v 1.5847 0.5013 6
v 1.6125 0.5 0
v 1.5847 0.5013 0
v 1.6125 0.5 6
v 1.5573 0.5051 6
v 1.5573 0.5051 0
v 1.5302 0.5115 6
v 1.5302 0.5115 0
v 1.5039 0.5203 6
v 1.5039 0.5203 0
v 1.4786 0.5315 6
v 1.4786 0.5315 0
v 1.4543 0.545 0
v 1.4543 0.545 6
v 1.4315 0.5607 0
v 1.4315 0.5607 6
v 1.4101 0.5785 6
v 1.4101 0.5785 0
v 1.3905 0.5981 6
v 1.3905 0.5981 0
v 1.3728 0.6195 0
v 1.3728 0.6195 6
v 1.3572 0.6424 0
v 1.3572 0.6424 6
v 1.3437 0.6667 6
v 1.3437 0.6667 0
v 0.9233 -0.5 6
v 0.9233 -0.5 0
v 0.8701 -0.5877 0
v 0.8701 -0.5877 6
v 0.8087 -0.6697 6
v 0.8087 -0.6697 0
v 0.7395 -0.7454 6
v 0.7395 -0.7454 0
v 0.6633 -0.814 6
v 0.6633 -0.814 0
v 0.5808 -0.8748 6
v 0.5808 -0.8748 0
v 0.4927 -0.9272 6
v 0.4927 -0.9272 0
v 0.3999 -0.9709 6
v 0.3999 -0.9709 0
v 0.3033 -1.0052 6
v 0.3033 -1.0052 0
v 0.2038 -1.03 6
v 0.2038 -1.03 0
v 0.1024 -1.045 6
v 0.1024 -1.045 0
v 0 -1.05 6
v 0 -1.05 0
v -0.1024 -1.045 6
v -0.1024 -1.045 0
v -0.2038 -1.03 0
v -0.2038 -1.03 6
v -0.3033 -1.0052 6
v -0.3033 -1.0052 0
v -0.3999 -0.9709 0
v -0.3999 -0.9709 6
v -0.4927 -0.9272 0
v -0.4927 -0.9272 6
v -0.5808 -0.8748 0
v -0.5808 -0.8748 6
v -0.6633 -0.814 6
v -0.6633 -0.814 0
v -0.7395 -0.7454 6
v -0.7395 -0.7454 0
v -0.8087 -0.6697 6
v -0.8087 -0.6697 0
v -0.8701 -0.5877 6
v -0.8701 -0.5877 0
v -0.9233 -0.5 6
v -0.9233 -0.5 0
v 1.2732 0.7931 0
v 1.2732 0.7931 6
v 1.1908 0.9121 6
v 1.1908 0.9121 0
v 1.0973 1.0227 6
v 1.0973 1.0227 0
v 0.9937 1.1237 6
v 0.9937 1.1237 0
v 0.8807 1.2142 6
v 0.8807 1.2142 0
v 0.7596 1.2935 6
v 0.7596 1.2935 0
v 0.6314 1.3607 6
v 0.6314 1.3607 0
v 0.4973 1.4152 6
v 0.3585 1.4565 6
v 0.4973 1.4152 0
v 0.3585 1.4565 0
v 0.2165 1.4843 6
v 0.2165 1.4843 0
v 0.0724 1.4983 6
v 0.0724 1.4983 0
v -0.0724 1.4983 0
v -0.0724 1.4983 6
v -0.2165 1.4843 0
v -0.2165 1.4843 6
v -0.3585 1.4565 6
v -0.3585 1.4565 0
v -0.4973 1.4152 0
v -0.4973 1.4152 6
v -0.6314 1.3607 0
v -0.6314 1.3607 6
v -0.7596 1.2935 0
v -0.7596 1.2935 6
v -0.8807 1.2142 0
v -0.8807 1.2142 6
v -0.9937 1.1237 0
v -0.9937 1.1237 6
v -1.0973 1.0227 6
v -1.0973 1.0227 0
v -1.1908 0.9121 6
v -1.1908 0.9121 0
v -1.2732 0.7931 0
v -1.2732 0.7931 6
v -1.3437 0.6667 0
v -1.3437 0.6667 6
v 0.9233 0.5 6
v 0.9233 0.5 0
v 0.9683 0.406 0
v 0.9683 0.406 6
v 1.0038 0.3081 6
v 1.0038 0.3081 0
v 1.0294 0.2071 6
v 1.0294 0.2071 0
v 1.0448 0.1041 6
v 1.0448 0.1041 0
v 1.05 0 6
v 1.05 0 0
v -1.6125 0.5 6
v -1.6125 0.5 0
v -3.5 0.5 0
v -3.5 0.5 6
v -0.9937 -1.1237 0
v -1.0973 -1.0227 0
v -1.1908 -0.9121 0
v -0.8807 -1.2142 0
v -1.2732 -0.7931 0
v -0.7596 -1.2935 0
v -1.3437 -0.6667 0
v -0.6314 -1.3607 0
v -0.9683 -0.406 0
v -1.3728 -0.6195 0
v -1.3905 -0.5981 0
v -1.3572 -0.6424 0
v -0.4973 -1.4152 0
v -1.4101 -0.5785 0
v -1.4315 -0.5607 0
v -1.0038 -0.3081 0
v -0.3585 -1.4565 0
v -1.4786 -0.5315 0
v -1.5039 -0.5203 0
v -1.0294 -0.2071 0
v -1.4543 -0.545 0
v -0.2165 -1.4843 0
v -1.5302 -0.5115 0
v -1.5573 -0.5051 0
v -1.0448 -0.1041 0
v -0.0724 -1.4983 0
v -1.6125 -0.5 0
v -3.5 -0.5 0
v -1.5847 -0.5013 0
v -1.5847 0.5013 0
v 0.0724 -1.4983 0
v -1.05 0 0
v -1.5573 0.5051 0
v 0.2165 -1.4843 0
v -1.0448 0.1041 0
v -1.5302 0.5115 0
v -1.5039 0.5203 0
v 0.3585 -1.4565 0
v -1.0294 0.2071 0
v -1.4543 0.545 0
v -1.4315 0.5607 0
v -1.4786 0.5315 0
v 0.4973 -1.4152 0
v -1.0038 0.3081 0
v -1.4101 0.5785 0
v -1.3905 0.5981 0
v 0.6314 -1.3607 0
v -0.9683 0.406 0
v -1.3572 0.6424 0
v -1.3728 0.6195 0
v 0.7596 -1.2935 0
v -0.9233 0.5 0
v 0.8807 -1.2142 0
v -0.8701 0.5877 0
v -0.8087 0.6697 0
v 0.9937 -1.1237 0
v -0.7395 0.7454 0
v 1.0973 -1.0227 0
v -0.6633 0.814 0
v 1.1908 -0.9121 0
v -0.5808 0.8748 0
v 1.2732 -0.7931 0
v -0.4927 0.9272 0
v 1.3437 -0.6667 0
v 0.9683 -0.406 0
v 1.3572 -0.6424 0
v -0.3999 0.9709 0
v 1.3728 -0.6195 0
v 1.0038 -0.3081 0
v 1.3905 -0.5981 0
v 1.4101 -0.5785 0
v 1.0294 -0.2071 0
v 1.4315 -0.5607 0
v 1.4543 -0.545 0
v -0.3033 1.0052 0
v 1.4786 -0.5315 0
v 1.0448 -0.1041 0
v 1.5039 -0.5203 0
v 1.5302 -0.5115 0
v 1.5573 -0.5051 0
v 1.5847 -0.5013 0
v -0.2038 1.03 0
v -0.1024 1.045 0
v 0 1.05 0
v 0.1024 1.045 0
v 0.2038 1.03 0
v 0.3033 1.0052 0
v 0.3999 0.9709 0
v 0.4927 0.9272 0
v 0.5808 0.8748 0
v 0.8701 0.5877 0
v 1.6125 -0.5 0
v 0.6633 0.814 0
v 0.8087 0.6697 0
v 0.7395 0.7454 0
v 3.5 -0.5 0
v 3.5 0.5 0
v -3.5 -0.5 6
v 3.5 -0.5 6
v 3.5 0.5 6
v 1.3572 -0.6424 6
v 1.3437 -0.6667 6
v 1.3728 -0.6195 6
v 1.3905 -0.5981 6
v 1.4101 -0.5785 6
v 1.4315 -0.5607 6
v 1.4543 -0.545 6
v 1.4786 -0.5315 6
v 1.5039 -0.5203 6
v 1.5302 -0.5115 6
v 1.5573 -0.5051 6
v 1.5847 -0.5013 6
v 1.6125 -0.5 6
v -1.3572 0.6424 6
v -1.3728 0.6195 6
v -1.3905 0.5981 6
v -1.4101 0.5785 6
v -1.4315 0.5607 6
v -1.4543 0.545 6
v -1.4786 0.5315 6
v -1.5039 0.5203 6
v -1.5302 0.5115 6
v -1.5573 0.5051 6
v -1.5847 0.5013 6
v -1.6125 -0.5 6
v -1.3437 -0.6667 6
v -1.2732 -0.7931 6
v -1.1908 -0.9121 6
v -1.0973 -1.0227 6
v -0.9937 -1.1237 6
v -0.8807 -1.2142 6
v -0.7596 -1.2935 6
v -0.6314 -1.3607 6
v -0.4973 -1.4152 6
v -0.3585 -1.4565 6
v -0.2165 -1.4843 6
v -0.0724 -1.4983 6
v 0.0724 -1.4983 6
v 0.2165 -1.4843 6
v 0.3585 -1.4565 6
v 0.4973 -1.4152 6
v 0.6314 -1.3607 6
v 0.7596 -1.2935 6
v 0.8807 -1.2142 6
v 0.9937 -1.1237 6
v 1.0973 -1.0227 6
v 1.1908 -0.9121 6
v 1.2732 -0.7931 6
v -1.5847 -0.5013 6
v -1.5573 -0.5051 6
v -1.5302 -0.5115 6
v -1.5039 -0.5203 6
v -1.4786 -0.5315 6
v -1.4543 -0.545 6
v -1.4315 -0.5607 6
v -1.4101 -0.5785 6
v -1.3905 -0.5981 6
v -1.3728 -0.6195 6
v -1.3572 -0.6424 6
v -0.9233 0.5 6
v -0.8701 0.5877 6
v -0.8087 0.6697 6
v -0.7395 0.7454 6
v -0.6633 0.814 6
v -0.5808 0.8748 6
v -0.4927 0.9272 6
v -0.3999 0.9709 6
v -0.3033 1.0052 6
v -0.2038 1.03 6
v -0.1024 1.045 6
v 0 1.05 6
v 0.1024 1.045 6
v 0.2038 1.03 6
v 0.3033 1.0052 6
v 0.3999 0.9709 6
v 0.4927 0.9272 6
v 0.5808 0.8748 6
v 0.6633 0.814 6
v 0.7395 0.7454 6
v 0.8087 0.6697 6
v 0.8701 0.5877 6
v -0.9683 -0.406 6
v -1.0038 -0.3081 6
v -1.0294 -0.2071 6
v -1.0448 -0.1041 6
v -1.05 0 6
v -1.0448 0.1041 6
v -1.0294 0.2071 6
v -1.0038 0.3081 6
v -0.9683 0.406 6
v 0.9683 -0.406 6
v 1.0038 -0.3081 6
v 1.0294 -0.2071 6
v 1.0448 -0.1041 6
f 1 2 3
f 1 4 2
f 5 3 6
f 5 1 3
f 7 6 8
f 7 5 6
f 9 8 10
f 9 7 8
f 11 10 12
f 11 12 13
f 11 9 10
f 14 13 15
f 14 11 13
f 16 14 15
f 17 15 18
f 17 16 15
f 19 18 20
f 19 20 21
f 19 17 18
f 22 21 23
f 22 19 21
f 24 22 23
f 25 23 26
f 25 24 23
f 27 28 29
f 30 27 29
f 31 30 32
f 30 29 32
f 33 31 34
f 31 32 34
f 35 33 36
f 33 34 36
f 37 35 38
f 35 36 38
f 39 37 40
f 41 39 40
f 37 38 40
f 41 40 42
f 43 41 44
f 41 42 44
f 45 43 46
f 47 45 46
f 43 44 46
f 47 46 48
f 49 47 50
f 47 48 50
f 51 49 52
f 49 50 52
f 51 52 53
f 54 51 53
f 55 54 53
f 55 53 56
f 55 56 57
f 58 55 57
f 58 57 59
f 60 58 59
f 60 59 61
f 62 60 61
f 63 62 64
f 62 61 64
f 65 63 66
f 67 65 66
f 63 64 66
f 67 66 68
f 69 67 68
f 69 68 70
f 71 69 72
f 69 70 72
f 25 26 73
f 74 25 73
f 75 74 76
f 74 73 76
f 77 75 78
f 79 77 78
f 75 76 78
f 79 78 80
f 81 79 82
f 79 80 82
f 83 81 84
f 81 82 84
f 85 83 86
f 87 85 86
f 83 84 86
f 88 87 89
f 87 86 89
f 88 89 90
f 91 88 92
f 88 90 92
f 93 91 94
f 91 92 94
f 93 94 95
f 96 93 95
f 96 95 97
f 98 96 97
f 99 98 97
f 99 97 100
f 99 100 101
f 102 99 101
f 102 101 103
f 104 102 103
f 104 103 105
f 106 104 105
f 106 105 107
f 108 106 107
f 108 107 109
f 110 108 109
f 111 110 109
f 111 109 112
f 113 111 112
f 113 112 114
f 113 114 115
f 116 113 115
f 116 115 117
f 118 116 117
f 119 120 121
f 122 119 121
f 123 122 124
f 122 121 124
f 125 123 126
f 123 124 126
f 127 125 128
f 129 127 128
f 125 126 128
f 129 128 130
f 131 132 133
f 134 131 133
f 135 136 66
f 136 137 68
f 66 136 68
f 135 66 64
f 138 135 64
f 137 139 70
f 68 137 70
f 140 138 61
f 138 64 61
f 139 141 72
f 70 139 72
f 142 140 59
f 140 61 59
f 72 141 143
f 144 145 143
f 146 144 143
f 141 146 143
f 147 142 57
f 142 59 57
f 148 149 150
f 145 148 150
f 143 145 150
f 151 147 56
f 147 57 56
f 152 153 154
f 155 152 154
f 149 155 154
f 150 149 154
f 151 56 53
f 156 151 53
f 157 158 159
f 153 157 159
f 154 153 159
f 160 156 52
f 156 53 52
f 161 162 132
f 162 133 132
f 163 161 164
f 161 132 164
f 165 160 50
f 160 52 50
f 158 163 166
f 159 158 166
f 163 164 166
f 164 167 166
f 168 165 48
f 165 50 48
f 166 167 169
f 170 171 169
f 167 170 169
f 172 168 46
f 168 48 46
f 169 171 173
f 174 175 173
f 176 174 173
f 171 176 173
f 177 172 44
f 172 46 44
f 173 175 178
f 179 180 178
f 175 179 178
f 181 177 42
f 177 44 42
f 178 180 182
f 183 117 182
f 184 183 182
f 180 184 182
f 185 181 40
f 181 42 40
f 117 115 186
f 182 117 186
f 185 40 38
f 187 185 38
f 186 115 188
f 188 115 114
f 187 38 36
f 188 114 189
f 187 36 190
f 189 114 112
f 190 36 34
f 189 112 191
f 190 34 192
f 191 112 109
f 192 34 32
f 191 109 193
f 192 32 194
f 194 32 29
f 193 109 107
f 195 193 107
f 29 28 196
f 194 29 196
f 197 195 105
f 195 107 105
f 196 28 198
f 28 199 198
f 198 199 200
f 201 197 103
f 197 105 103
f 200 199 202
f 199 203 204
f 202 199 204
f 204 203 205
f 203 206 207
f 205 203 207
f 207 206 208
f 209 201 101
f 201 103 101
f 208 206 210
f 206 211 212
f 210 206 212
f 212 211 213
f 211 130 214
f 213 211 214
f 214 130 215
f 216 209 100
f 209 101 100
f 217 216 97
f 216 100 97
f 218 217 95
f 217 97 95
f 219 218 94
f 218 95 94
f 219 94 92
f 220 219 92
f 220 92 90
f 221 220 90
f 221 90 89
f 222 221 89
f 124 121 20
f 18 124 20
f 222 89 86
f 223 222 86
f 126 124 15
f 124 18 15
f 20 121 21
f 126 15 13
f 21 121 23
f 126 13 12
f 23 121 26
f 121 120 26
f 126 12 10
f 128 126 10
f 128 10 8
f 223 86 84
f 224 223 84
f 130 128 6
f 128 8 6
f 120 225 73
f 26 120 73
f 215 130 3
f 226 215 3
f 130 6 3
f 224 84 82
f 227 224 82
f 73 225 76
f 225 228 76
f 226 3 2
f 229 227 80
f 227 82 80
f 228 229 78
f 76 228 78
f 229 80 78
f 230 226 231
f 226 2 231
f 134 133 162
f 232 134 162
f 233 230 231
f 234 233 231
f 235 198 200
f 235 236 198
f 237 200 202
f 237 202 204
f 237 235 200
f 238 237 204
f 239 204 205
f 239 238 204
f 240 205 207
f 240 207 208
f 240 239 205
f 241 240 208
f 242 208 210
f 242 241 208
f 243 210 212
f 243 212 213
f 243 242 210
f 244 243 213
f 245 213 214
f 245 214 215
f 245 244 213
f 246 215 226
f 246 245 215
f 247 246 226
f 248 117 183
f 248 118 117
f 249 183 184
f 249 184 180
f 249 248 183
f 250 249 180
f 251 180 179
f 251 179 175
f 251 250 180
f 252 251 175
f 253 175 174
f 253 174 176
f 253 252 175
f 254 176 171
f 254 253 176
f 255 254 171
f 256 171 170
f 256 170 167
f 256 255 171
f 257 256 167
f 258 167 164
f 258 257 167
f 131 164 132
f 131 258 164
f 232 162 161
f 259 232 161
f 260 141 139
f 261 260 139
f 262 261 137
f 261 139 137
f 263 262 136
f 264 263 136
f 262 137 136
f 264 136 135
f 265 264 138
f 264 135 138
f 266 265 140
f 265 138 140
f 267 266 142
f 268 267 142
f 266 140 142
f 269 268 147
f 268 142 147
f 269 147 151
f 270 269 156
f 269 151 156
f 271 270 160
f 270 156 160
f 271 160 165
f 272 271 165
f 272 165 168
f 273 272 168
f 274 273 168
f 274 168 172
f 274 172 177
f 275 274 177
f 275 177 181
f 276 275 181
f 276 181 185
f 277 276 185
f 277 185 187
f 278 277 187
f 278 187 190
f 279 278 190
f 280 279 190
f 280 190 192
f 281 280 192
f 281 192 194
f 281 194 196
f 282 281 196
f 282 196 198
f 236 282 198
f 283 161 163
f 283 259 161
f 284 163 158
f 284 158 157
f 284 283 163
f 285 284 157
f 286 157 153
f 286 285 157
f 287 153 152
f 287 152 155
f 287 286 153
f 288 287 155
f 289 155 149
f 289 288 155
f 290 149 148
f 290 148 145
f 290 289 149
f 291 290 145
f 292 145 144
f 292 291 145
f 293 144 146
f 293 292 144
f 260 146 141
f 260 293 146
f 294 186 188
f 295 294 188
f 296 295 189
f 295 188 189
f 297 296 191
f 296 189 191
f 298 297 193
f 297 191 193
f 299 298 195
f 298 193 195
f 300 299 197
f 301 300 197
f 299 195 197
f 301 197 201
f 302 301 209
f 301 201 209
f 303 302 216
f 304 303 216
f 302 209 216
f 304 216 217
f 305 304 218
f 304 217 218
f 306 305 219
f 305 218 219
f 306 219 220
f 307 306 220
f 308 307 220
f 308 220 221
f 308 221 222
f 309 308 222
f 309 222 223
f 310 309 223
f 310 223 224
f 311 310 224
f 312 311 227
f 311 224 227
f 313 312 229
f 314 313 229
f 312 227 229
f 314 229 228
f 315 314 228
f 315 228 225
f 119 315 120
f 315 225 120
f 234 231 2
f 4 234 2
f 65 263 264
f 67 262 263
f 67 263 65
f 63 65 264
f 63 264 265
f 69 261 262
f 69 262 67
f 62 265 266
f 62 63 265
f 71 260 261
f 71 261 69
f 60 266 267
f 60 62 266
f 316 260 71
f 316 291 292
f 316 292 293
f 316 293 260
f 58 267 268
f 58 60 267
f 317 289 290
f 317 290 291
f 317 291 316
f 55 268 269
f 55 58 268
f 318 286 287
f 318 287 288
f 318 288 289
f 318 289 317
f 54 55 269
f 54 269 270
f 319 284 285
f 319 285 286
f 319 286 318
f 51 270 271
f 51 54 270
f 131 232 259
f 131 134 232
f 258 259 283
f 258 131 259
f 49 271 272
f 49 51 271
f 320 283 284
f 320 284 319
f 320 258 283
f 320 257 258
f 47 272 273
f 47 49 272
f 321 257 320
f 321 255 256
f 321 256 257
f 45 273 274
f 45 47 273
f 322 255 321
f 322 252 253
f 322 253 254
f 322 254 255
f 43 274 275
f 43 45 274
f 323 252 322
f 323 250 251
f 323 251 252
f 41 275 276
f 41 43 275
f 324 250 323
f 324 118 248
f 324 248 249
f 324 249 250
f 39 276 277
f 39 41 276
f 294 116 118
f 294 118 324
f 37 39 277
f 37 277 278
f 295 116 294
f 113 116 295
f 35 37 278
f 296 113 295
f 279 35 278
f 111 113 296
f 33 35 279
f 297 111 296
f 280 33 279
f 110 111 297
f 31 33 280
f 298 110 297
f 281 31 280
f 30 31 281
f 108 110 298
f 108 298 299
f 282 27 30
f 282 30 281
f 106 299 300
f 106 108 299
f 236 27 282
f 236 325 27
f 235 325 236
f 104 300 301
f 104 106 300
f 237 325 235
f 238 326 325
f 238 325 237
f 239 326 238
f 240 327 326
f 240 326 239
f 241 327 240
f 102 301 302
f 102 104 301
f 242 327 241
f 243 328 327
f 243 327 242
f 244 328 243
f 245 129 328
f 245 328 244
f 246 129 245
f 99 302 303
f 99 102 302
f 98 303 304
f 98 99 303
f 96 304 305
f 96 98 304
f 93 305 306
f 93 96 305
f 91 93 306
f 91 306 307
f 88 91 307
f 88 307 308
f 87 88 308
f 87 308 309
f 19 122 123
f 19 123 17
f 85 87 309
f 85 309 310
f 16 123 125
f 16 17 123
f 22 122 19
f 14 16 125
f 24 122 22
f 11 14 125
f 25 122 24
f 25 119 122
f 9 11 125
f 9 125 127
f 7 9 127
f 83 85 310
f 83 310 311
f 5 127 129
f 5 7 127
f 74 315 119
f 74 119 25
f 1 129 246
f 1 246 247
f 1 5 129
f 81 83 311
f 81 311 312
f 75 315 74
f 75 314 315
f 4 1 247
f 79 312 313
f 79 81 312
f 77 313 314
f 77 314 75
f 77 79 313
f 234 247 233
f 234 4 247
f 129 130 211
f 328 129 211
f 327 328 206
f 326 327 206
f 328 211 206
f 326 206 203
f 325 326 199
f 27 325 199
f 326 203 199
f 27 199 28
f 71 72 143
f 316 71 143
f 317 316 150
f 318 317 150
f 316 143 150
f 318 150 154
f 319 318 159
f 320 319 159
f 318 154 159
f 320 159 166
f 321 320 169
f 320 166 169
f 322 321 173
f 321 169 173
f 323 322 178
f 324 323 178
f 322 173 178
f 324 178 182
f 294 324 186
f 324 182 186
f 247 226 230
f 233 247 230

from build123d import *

# Parameters (mm, degrees)
F1_DEPTH = 6
F2_R     = 0.3


with BuildPart() as f1:
    # F0 (on Top) → F1 (new body)
    with BuildSketch(Plane.XY):
        with BuildLine():
            Line((-3.5, 0.5), (-3.5, -0.5))
            Line((-3.5, -0.5), (-1.4142135624, -0.5))
            ThreePointArc((-1.4142135624, -0.5), (-1.5, 0), (-1.4142135624, 0.5))
            Line((-1.4142135624, 0.5), (-3.5, 0.5))
        make_face()
        with BuildLine():
            ThreePointArc((-1.4142135624, 0.5), (-1.5, 0), (-1.4142135624, -0.5))
            Line((-1.4142135624, -0.5), (-0.9233092656, -0.5))
            ThreePointArc((-0.9233092656, -0.5), (-1.05, 0), (-0.9233092656, 0.5))
            Line((-0.9233092656, 0.5), (-1.4142135624, 0.5))
        make_face()
        with BuildLine():
            Line((-0.9233092656, -0.5), (-1.4142135624, -0.5))
            ThreePointArc((-1.4142135624, -0.5), (0, -1.5), (1.4142135624, -0.5))
            Line((1.4142135624, -0.5), (0.9233092656, -0.5))
            ThreePointArc((0.9233092656, -0.5), (0, -1.05), (-0.9233092656, -0.5))
        make_face()
        with BuildLine():
            ThreePointArc((1.4142135624, 0.5), (0, 1.5), (-1.4142135624, 0.5))
            Line((-1.4142135624, 0.5), (-0.9233092656, 0.5))
            ThreePointArc((-0.9233092656, 0.5), (0, 1.05), (0.9233092656, 0.5))
            Line((0.9233092656, 0.5), (1.4142135624, 0.5))
        make_face()
        with BuildLine():
            ThreePointArc((1.5, 0), (1.4783978395, -0.2536529681), (1.4142135624, -0.5))
            Line((1.4142135624, -0.5), (3.5, -0.5))
            Line((3.5, -0.5), (3.5, 0.5))
            Line((3.5, 0.5), (1.4142135624, 0.5))
            ThreePointArc((1.4142135624, 0.5), (1.4783978395, 0.2536529681), (1.5, 0))
        make_face()
        with BuildLine():
            Line((0.9233092656, -0.5), (1.4142135624, -0.5))
            ThreePointArc((1.4142135624, -0.5), (1.4783978395, -0.2536529681), (1.5, 0))
            ThreePointArc((1.5, 0), (1.4783978395, 0.2536529681), (1.4142135624, 0.5))
            Line((1.4142135624, 0.5), (0.9233092656, 0.5))
            ThreePointArc((0.9233092656, 0.5), (1.0178346449, 0.2579004373), (1.05, 0))
            ThreePointArc((1.05, 0), (1.0178346449, -0.2579004373), (0.9233092656, -0.5))
        make_face()
    extrude(amount=F1_DEPTH)

    # F2
    f2_edges = [f1.edges().sort_by_distance(p)[0] for p in [
        (1.414214, -0.5, 3),
        (-1.414214, -0.5, 3),
        (1.414214, 0.5, 3),
        (-1.414214, 0.5, 3),
    ]]
    fillet(f2_edges, radius=F2_R)


solid = f1.part
